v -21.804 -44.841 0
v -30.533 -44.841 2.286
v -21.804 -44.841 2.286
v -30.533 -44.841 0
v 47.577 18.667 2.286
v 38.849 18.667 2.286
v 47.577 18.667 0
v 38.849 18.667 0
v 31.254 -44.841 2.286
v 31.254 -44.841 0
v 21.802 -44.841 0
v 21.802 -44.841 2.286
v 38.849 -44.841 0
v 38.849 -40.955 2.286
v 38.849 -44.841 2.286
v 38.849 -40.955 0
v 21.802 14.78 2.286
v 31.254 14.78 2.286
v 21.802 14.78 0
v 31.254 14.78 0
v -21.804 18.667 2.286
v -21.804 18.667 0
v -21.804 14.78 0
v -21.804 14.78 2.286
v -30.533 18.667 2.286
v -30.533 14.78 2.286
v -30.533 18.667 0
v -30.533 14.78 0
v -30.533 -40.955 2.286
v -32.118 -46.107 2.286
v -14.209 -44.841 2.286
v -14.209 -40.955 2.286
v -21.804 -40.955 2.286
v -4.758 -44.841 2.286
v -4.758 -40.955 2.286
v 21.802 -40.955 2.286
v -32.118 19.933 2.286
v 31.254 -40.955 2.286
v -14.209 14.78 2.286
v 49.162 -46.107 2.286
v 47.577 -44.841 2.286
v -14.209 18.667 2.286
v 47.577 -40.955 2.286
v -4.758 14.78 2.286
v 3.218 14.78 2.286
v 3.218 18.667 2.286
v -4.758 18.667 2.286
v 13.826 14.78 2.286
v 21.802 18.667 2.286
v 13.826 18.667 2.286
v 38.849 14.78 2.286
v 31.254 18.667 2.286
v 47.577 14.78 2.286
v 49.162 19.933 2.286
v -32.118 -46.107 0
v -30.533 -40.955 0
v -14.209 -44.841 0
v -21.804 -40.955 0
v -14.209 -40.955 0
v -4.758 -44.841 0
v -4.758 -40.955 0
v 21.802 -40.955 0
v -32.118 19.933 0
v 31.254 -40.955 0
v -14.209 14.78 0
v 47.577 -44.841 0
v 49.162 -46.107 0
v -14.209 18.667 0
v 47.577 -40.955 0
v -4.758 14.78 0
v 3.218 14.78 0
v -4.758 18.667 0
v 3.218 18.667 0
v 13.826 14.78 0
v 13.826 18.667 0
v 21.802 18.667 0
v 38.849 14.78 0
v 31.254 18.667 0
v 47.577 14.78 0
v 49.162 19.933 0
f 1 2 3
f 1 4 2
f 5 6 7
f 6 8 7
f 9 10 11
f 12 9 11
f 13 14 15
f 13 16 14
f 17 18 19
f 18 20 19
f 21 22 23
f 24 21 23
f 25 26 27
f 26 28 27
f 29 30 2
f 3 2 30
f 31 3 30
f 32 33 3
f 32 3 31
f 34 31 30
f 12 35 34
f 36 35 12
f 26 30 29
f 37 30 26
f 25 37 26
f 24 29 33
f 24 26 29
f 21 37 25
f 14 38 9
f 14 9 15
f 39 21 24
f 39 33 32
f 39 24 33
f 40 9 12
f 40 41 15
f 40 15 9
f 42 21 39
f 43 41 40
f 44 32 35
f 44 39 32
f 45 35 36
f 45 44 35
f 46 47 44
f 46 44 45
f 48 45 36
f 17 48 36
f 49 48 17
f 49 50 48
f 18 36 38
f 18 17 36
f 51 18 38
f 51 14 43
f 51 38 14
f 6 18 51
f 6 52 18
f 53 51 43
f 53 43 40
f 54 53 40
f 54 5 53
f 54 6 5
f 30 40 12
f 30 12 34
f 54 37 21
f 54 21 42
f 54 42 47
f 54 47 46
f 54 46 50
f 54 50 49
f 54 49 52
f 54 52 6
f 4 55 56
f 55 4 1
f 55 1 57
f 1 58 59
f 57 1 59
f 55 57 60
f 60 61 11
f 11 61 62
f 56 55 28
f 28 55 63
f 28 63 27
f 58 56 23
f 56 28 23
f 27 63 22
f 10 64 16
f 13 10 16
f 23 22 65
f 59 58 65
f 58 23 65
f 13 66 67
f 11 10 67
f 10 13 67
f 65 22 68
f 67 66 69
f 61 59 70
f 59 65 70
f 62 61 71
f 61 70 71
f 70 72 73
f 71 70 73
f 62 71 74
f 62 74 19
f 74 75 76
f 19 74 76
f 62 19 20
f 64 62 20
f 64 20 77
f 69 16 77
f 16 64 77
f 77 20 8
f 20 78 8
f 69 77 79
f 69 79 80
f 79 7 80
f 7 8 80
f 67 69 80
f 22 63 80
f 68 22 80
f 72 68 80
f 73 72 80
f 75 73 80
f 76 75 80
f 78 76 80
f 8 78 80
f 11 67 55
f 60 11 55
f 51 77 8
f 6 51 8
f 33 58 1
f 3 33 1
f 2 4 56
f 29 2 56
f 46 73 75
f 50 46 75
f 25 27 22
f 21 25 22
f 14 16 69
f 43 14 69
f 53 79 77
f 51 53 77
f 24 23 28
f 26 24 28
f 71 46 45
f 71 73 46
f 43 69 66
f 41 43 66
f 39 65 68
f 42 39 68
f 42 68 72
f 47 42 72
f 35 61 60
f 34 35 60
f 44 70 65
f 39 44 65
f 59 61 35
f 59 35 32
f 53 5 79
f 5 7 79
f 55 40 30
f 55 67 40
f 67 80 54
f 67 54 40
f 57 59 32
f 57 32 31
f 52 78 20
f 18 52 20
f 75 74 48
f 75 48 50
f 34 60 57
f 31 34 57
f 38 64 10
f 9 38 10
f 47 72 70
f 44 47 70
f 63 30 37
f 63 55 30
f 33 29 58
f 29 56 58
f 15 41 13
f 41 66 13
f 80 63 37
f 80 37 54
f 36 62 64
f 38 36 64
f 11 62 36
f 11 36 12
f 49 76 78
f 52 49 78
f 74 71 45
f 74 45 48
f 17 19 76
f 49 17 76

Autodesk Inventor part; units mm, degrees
ref_plane "YZ Plane" through (0, 0, 0) normal (1, 0, 0) x (0, 1, 0)
ref_plane "XZ Plane" through (0, 0, 0) normal (0, 1, 0) x (-1, 0, 0)
ref_plane "XY Plane" through (0, 0, 0) normal (0, 0, 1) x (1, 0, 0)
sketch "Sketch1" plane through (0, 0, 0) normal (0, 0, 1) x (1, 0, 0)
  line L0 (49.1624, -46.1074) -> (-32.1176, -46.1074)
  line L1 (49.1624, 19.9326) -> (49.1624, -46.1074)
  line L2 (49.1624, -46.1074) -> (49.1624, 19.9326)
  line L3 (-32.1176, 19.9326) -> (49.1624, 19.9326)
  line L4 (49.1624, 19.9326) -> (-32.1176, 19.9326)
  line L5 (-32.1176, -46.1074) -> (-32.1176, 19.9326)
  line L6 (-32.1176, 19.9326) -> (-32.1176, -46.1074)
  line L7 (-32.1176, -46.1074) -> (49.1624, -46.1074)
  line L8 (47.5774, -44.8414) -> (38.8489, -44.8414)
  line L9 (47.5774, -44.8414) -> (38.8489, -44.8414)
  line L10 (38.8489, -40.9552) -> (38.8489, -44.8414)
  line L11 (38.8489, -44.8414) -> (38.8489, -40.9552)
  line L12 (38.8489, -40.9552) -> (47.5774, -40.9552)
  line L13 (38.8489, -40.9552) -> (47.5774, -40.9552)
  line L14 (47.5774, -40.9552) -> (47.5774, -44.8414)
  line L15 (47.5774, -40.9552) -> (47.5774, -44.8414)
  line L16 (47.5774, 14.7804) -> (38.8489, 14.7804)
  line L17 (47.5774, 14.7804) -> (38.8489, 14.7804)
  line L18 (38.8489, 14.7804) -> (38.8489, 18.6666)
  line L19 (38.8489, 14.7804) -> (38.8489, 18.6666)
  line L20 (38.8489, 18.6666) -> (47.5774, 18.6666)
  line L21 (38.8489, 18.6666) -> (47.5774, 18.6666)
  line L22 (47.5774, 18.6666) -> (47.5774, 14.7804)
  line L23 (47.5774, 18.6666) -> (47.5774, 14.7804)
  line L24 (31.2541, -44.8414) -> (21.8023, -44.8414)
  line L25 (31.2541, -44.8414) -> (21.8023, -44.8414)
  line L26 (21.8023, -40.9552) -> (21.8023, -44.8414)
  line L27 (21.8023, -44.8414) -> (21.8023, -40.9552)
  line L28 (21.8023, -40.9552) -> (31.2541, -40.9552)
  line L29 (31.2541, -40.9552) -> (31.2541, -44.8414)
  line L30 (31.2541, -40.9552) -> (31.2541, -44.8414)
  line L31 (-4.7575, -44.8414) -> (-14.2093, -44.8414)
  line L32 (-4.7575, -44.8414) -> (-14.2093, -44.8414)
  line L33 (-14.2093, -40.9552) -> (-14.2093, -44.8414)
  line L34 (-14.2093, -44.8414) -> (-14.2093, -40.9552)
  line L35 (-4.7575, -40.9552) -> (-14.2093, -40.9552)
  line L36 (-14.2093, -40.9552) -> (-4.7575, -40.9552)
  line L37 (-4.7575, -40.9552) -> (-4.7575, -44.8414)
  line L38 (-4.7575, -40.9552) -> (-4.7575, -44.8414)
  line L39 (-21.804, -40.9552) -> (-21.804, -44.8414)
  line L40 (-30.5326, -44.8414) -> (-21.804, -44.8414)
  line L41 (-21.804, -44.8414) -> (-30.5326, -44.8414)
  line L42 (-30.5326, -44.8414) -> (-30.5326, -40.9552)
  line L43 (-30.5326, -40.9552) -> (-21.804, -40.9552)
  line L44 (-30.5326, -40.9552) -> (-21.804, -40.9552)
  line L45 (-21.804, -40.9552) -> (-21.804, -44.8414)
  line L46 (31.2541, 14.7804) -> (21.8023, 14.7804)
  line L47 (31.2541, 14.7804) -> (21.8023, 14.7804)
  line L48 (21.8023, 14.7804) -> (21.8023, 18.6666)
  line L49 (21.8023, 14.7804) -> (21.8023, 18.6666)
  line L50 (21.8023, 18.6666) -> (31.2541, 18.6666)
  line L51 (21.8023, 18.6666) -> (31.2541, 18.6666)
  line L52 (31.2541, 18.6666) -> (31.2541, 14.7804)
  line L53 (31.2541, 18.6666) -> (31.2541, 14.7804)
  line L54 (3.2185, 14.7804) -> (13.8264, 14.7804)
  line L55 (13.8264, 14.7804) -> (3.2185, 14.7804)
  line L56 (3.2185, 18.6666) -> (3.2185, 14.7804)
  line L57 (3.2185, 14.7804) -> (3.2185, 18.6666)
  line L58 (3.2185, 18.6666) -> (13.8264, 18.6666)
  line L59 (3.2185, 18.6666) -> (13.8264, 18.6666)
  line L60 (13.8264, 14.7804) -> (13.8264, 18.6666)
  line L61 (13.8264, 18.6666) -> (13.8264, 14.7804)
  line L62 (-4.7575, 14.7804) -> (-14.2093, 14.7804)
  line L63 (-4.7575, 14.7804) -> (-14.2093, 14.7804)
  line L64 (-14.2093, 14.7804) -> (-14.2093, 18.6666)
  line L65 (-14.2093, 14.7804) -> (-14.2093, 18.6666)
  line L66 (-14.2093, 18.6666) -> (-4.7575, 18.6666)
  line L67 (-14.2093, 18.6666) -> (-4.7575, 18.6666)
  line L68 (-4.7575, 18.6666) -> (-4.7575, 14.7804)
  line L69 (-4.7575, 18.6666) -> (-4.7575, 14.7804)
  line L70 (-21.804, 18.6666) -> (-21.804, 14.7804)
  line L71 (-21.804, 14.7804) -> (-30.5326, 14.7804)
  line L72 (-21.804, 14.7804) -> (-30.5326, 14.7804)
  line L73 (-30.5326, 18.6666) -> (-21.804, 18.6666)
  line L74 (-30.5326, 14.7804) -> (-30.5326, 18.6666)
  line L75 (-30.5326, 18.6666) -> (-21.804, 18.6666)
  line L76 (-21.804, 18.6666) -> (-21.804, 14.7804)
  point P0 (0, 0)
  point P1 (0, 0)
extrude "Extrusion1" add sketch "Sketch1" along normal blind 2.286
sketch "Sketch2" plane through (0, 0, 2.286) normal (0, 0, 1) x (1, 0, 0)
  line L0 (-30.5326, 18.6666) -> (-30.5326, 14.7804) projected
  line L1 (47.5774, 18.6666) -> (38.8489, 18.6666) projected
  line L2 (-30.5326, 18.6666) -> (47.5774, 18.6666)
  line L3 (47.5774, 18.6666) -> (47.5774, 14.7804) projected
  line L4 (47.5774, 18.6666) -> (47.5774, 14.7804)
  line L5 (-30.5326, 14.7804) -> (-21.804, 14.7804) projected
  line L6 (47.5774, 14.7804) -> (-30.5326, 14.7804)
  line L7 (-21.804, 18.6666) -> (-21.804, 14.7804) projected
  line L8 (-21.804, 18.6666) -> (-21.804, 14.7804)
  line L9 (-4.7575, 18.6666) -> (-14.2093, 18.6666) projected
  line L10 (-14.2093, 14.7804) -> (-14.2093, 18.6666) projected
  line L11 (-14.2093, 18.6666) -> (-14.2093, 14.7804)
  line L12 (3.2185, 14.7804) -> (3.2185, 18.6666) projected
  line L13 (3.2185, 18.6666) -> (3.2185, 14.7804)
  line L14 (13.8264, 18.6666) -> (13.8264, 14.7804) projected
  line L15 (13.8264, 18.6666) -> (13.8264, 14.7804)
  line L16 (21.8023, 18.6666) -> (21.8023, 14.7804)
  line L17 (31.2541, 18.6666) -> (31.2541, 14.7804) projected
  line L18 (31.2541, 18.6666) -> (31.2541, 14.7804)
  line L19 (38.8489, 14.7804) -> (47.5774, 14.7804) projected
  line L20 (38.8489, 18.6666) -> (38.8489, 14.7804)
  point P0 (0, 0)
properties part number "mcdave_scelevel"
